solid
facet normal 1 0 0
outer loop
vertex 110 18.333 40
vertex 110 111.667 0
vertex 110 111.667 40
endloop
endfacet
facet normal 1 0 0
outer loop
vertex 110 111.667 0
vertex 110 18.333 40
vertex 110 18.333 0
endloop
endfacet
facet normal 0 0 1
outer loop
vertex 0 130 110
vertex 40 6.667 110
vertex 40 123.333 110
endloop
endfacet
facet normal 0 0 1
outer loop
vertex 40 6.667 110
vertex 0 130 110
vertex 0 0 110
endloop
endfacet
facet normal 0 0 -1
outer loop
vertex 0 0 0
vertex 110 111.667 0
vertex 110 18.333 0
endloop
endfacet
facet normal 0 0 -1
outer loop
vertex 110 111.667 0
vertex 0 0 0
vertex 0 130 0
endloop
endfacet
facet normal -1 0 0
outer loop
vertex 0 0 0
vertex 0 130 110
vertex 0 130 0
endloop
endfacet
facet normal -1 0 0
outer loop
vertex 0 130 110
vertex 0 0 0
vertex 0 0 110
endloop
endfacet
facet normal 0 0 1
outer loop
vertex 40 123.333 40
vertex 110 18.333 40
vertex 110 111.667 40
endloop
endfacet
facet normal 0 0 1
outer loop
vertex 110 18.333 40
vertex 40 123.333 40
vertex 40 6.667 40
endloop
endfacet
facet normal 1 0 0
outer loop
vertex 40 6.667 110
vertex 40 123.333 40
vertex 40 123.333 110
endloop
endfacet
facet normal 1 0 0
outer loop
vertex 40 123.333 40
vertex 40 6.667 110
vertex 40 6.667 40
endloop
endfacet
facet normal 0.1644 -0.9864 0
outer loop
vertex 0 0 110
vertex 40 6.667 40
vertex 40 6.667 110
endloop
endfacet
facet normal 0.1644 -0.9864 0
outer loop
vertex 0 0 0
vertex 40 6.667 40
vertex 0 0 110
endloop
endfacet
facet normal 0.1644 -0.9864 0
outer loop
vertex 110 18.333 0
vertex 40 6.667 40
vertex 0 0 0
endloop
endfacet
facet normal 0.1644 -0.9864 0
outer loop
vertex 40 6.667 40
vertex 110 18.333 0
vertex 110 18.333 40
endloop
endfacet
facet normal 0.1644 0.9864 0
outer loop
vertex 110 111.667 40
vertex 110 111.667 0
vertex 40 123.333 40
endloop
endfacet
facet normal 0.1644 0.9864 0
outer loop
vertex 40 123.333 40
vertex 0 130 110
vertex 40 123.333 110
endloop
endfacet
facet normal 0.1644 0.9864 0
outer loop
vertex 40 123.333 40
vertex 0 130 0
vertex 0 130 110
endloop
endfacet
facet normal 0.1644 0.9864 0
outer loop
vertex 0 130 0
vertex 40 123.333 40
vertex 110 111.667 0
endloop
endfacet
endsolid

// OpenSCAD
ratio = 6; // 6:1
angle = atan(1/ratio);
epsilon = 0.01;
overall_length = 110;
overall_width = 130;
overall_height = 110;
wall_thickness = 40;

difference() {
  cube([overall_length, overall_width, overall_height]);
  translate([wall_thickness,-epsilon,wall_thickness]) {
    cube([overall_length+2*epsilon,overall_width+2*epsilon,overall_height+2*epsilon]);
  }
  rotate([0,0,angle]) {
    translate([0, -overall_width, -epsilon]) {
      color([1,0,0,1]) {
        cube([overall_length*2, overall_width, overall_height*2]);
      }
    }
  }
  translate([0, overall_width, -epsilon]) {
    color([0,1,0,1]) {
      rotate([0,0,-angle]) {
        cube([overall_length*2, overall_width, overall_height*2]);
      }
    }
  }
}
